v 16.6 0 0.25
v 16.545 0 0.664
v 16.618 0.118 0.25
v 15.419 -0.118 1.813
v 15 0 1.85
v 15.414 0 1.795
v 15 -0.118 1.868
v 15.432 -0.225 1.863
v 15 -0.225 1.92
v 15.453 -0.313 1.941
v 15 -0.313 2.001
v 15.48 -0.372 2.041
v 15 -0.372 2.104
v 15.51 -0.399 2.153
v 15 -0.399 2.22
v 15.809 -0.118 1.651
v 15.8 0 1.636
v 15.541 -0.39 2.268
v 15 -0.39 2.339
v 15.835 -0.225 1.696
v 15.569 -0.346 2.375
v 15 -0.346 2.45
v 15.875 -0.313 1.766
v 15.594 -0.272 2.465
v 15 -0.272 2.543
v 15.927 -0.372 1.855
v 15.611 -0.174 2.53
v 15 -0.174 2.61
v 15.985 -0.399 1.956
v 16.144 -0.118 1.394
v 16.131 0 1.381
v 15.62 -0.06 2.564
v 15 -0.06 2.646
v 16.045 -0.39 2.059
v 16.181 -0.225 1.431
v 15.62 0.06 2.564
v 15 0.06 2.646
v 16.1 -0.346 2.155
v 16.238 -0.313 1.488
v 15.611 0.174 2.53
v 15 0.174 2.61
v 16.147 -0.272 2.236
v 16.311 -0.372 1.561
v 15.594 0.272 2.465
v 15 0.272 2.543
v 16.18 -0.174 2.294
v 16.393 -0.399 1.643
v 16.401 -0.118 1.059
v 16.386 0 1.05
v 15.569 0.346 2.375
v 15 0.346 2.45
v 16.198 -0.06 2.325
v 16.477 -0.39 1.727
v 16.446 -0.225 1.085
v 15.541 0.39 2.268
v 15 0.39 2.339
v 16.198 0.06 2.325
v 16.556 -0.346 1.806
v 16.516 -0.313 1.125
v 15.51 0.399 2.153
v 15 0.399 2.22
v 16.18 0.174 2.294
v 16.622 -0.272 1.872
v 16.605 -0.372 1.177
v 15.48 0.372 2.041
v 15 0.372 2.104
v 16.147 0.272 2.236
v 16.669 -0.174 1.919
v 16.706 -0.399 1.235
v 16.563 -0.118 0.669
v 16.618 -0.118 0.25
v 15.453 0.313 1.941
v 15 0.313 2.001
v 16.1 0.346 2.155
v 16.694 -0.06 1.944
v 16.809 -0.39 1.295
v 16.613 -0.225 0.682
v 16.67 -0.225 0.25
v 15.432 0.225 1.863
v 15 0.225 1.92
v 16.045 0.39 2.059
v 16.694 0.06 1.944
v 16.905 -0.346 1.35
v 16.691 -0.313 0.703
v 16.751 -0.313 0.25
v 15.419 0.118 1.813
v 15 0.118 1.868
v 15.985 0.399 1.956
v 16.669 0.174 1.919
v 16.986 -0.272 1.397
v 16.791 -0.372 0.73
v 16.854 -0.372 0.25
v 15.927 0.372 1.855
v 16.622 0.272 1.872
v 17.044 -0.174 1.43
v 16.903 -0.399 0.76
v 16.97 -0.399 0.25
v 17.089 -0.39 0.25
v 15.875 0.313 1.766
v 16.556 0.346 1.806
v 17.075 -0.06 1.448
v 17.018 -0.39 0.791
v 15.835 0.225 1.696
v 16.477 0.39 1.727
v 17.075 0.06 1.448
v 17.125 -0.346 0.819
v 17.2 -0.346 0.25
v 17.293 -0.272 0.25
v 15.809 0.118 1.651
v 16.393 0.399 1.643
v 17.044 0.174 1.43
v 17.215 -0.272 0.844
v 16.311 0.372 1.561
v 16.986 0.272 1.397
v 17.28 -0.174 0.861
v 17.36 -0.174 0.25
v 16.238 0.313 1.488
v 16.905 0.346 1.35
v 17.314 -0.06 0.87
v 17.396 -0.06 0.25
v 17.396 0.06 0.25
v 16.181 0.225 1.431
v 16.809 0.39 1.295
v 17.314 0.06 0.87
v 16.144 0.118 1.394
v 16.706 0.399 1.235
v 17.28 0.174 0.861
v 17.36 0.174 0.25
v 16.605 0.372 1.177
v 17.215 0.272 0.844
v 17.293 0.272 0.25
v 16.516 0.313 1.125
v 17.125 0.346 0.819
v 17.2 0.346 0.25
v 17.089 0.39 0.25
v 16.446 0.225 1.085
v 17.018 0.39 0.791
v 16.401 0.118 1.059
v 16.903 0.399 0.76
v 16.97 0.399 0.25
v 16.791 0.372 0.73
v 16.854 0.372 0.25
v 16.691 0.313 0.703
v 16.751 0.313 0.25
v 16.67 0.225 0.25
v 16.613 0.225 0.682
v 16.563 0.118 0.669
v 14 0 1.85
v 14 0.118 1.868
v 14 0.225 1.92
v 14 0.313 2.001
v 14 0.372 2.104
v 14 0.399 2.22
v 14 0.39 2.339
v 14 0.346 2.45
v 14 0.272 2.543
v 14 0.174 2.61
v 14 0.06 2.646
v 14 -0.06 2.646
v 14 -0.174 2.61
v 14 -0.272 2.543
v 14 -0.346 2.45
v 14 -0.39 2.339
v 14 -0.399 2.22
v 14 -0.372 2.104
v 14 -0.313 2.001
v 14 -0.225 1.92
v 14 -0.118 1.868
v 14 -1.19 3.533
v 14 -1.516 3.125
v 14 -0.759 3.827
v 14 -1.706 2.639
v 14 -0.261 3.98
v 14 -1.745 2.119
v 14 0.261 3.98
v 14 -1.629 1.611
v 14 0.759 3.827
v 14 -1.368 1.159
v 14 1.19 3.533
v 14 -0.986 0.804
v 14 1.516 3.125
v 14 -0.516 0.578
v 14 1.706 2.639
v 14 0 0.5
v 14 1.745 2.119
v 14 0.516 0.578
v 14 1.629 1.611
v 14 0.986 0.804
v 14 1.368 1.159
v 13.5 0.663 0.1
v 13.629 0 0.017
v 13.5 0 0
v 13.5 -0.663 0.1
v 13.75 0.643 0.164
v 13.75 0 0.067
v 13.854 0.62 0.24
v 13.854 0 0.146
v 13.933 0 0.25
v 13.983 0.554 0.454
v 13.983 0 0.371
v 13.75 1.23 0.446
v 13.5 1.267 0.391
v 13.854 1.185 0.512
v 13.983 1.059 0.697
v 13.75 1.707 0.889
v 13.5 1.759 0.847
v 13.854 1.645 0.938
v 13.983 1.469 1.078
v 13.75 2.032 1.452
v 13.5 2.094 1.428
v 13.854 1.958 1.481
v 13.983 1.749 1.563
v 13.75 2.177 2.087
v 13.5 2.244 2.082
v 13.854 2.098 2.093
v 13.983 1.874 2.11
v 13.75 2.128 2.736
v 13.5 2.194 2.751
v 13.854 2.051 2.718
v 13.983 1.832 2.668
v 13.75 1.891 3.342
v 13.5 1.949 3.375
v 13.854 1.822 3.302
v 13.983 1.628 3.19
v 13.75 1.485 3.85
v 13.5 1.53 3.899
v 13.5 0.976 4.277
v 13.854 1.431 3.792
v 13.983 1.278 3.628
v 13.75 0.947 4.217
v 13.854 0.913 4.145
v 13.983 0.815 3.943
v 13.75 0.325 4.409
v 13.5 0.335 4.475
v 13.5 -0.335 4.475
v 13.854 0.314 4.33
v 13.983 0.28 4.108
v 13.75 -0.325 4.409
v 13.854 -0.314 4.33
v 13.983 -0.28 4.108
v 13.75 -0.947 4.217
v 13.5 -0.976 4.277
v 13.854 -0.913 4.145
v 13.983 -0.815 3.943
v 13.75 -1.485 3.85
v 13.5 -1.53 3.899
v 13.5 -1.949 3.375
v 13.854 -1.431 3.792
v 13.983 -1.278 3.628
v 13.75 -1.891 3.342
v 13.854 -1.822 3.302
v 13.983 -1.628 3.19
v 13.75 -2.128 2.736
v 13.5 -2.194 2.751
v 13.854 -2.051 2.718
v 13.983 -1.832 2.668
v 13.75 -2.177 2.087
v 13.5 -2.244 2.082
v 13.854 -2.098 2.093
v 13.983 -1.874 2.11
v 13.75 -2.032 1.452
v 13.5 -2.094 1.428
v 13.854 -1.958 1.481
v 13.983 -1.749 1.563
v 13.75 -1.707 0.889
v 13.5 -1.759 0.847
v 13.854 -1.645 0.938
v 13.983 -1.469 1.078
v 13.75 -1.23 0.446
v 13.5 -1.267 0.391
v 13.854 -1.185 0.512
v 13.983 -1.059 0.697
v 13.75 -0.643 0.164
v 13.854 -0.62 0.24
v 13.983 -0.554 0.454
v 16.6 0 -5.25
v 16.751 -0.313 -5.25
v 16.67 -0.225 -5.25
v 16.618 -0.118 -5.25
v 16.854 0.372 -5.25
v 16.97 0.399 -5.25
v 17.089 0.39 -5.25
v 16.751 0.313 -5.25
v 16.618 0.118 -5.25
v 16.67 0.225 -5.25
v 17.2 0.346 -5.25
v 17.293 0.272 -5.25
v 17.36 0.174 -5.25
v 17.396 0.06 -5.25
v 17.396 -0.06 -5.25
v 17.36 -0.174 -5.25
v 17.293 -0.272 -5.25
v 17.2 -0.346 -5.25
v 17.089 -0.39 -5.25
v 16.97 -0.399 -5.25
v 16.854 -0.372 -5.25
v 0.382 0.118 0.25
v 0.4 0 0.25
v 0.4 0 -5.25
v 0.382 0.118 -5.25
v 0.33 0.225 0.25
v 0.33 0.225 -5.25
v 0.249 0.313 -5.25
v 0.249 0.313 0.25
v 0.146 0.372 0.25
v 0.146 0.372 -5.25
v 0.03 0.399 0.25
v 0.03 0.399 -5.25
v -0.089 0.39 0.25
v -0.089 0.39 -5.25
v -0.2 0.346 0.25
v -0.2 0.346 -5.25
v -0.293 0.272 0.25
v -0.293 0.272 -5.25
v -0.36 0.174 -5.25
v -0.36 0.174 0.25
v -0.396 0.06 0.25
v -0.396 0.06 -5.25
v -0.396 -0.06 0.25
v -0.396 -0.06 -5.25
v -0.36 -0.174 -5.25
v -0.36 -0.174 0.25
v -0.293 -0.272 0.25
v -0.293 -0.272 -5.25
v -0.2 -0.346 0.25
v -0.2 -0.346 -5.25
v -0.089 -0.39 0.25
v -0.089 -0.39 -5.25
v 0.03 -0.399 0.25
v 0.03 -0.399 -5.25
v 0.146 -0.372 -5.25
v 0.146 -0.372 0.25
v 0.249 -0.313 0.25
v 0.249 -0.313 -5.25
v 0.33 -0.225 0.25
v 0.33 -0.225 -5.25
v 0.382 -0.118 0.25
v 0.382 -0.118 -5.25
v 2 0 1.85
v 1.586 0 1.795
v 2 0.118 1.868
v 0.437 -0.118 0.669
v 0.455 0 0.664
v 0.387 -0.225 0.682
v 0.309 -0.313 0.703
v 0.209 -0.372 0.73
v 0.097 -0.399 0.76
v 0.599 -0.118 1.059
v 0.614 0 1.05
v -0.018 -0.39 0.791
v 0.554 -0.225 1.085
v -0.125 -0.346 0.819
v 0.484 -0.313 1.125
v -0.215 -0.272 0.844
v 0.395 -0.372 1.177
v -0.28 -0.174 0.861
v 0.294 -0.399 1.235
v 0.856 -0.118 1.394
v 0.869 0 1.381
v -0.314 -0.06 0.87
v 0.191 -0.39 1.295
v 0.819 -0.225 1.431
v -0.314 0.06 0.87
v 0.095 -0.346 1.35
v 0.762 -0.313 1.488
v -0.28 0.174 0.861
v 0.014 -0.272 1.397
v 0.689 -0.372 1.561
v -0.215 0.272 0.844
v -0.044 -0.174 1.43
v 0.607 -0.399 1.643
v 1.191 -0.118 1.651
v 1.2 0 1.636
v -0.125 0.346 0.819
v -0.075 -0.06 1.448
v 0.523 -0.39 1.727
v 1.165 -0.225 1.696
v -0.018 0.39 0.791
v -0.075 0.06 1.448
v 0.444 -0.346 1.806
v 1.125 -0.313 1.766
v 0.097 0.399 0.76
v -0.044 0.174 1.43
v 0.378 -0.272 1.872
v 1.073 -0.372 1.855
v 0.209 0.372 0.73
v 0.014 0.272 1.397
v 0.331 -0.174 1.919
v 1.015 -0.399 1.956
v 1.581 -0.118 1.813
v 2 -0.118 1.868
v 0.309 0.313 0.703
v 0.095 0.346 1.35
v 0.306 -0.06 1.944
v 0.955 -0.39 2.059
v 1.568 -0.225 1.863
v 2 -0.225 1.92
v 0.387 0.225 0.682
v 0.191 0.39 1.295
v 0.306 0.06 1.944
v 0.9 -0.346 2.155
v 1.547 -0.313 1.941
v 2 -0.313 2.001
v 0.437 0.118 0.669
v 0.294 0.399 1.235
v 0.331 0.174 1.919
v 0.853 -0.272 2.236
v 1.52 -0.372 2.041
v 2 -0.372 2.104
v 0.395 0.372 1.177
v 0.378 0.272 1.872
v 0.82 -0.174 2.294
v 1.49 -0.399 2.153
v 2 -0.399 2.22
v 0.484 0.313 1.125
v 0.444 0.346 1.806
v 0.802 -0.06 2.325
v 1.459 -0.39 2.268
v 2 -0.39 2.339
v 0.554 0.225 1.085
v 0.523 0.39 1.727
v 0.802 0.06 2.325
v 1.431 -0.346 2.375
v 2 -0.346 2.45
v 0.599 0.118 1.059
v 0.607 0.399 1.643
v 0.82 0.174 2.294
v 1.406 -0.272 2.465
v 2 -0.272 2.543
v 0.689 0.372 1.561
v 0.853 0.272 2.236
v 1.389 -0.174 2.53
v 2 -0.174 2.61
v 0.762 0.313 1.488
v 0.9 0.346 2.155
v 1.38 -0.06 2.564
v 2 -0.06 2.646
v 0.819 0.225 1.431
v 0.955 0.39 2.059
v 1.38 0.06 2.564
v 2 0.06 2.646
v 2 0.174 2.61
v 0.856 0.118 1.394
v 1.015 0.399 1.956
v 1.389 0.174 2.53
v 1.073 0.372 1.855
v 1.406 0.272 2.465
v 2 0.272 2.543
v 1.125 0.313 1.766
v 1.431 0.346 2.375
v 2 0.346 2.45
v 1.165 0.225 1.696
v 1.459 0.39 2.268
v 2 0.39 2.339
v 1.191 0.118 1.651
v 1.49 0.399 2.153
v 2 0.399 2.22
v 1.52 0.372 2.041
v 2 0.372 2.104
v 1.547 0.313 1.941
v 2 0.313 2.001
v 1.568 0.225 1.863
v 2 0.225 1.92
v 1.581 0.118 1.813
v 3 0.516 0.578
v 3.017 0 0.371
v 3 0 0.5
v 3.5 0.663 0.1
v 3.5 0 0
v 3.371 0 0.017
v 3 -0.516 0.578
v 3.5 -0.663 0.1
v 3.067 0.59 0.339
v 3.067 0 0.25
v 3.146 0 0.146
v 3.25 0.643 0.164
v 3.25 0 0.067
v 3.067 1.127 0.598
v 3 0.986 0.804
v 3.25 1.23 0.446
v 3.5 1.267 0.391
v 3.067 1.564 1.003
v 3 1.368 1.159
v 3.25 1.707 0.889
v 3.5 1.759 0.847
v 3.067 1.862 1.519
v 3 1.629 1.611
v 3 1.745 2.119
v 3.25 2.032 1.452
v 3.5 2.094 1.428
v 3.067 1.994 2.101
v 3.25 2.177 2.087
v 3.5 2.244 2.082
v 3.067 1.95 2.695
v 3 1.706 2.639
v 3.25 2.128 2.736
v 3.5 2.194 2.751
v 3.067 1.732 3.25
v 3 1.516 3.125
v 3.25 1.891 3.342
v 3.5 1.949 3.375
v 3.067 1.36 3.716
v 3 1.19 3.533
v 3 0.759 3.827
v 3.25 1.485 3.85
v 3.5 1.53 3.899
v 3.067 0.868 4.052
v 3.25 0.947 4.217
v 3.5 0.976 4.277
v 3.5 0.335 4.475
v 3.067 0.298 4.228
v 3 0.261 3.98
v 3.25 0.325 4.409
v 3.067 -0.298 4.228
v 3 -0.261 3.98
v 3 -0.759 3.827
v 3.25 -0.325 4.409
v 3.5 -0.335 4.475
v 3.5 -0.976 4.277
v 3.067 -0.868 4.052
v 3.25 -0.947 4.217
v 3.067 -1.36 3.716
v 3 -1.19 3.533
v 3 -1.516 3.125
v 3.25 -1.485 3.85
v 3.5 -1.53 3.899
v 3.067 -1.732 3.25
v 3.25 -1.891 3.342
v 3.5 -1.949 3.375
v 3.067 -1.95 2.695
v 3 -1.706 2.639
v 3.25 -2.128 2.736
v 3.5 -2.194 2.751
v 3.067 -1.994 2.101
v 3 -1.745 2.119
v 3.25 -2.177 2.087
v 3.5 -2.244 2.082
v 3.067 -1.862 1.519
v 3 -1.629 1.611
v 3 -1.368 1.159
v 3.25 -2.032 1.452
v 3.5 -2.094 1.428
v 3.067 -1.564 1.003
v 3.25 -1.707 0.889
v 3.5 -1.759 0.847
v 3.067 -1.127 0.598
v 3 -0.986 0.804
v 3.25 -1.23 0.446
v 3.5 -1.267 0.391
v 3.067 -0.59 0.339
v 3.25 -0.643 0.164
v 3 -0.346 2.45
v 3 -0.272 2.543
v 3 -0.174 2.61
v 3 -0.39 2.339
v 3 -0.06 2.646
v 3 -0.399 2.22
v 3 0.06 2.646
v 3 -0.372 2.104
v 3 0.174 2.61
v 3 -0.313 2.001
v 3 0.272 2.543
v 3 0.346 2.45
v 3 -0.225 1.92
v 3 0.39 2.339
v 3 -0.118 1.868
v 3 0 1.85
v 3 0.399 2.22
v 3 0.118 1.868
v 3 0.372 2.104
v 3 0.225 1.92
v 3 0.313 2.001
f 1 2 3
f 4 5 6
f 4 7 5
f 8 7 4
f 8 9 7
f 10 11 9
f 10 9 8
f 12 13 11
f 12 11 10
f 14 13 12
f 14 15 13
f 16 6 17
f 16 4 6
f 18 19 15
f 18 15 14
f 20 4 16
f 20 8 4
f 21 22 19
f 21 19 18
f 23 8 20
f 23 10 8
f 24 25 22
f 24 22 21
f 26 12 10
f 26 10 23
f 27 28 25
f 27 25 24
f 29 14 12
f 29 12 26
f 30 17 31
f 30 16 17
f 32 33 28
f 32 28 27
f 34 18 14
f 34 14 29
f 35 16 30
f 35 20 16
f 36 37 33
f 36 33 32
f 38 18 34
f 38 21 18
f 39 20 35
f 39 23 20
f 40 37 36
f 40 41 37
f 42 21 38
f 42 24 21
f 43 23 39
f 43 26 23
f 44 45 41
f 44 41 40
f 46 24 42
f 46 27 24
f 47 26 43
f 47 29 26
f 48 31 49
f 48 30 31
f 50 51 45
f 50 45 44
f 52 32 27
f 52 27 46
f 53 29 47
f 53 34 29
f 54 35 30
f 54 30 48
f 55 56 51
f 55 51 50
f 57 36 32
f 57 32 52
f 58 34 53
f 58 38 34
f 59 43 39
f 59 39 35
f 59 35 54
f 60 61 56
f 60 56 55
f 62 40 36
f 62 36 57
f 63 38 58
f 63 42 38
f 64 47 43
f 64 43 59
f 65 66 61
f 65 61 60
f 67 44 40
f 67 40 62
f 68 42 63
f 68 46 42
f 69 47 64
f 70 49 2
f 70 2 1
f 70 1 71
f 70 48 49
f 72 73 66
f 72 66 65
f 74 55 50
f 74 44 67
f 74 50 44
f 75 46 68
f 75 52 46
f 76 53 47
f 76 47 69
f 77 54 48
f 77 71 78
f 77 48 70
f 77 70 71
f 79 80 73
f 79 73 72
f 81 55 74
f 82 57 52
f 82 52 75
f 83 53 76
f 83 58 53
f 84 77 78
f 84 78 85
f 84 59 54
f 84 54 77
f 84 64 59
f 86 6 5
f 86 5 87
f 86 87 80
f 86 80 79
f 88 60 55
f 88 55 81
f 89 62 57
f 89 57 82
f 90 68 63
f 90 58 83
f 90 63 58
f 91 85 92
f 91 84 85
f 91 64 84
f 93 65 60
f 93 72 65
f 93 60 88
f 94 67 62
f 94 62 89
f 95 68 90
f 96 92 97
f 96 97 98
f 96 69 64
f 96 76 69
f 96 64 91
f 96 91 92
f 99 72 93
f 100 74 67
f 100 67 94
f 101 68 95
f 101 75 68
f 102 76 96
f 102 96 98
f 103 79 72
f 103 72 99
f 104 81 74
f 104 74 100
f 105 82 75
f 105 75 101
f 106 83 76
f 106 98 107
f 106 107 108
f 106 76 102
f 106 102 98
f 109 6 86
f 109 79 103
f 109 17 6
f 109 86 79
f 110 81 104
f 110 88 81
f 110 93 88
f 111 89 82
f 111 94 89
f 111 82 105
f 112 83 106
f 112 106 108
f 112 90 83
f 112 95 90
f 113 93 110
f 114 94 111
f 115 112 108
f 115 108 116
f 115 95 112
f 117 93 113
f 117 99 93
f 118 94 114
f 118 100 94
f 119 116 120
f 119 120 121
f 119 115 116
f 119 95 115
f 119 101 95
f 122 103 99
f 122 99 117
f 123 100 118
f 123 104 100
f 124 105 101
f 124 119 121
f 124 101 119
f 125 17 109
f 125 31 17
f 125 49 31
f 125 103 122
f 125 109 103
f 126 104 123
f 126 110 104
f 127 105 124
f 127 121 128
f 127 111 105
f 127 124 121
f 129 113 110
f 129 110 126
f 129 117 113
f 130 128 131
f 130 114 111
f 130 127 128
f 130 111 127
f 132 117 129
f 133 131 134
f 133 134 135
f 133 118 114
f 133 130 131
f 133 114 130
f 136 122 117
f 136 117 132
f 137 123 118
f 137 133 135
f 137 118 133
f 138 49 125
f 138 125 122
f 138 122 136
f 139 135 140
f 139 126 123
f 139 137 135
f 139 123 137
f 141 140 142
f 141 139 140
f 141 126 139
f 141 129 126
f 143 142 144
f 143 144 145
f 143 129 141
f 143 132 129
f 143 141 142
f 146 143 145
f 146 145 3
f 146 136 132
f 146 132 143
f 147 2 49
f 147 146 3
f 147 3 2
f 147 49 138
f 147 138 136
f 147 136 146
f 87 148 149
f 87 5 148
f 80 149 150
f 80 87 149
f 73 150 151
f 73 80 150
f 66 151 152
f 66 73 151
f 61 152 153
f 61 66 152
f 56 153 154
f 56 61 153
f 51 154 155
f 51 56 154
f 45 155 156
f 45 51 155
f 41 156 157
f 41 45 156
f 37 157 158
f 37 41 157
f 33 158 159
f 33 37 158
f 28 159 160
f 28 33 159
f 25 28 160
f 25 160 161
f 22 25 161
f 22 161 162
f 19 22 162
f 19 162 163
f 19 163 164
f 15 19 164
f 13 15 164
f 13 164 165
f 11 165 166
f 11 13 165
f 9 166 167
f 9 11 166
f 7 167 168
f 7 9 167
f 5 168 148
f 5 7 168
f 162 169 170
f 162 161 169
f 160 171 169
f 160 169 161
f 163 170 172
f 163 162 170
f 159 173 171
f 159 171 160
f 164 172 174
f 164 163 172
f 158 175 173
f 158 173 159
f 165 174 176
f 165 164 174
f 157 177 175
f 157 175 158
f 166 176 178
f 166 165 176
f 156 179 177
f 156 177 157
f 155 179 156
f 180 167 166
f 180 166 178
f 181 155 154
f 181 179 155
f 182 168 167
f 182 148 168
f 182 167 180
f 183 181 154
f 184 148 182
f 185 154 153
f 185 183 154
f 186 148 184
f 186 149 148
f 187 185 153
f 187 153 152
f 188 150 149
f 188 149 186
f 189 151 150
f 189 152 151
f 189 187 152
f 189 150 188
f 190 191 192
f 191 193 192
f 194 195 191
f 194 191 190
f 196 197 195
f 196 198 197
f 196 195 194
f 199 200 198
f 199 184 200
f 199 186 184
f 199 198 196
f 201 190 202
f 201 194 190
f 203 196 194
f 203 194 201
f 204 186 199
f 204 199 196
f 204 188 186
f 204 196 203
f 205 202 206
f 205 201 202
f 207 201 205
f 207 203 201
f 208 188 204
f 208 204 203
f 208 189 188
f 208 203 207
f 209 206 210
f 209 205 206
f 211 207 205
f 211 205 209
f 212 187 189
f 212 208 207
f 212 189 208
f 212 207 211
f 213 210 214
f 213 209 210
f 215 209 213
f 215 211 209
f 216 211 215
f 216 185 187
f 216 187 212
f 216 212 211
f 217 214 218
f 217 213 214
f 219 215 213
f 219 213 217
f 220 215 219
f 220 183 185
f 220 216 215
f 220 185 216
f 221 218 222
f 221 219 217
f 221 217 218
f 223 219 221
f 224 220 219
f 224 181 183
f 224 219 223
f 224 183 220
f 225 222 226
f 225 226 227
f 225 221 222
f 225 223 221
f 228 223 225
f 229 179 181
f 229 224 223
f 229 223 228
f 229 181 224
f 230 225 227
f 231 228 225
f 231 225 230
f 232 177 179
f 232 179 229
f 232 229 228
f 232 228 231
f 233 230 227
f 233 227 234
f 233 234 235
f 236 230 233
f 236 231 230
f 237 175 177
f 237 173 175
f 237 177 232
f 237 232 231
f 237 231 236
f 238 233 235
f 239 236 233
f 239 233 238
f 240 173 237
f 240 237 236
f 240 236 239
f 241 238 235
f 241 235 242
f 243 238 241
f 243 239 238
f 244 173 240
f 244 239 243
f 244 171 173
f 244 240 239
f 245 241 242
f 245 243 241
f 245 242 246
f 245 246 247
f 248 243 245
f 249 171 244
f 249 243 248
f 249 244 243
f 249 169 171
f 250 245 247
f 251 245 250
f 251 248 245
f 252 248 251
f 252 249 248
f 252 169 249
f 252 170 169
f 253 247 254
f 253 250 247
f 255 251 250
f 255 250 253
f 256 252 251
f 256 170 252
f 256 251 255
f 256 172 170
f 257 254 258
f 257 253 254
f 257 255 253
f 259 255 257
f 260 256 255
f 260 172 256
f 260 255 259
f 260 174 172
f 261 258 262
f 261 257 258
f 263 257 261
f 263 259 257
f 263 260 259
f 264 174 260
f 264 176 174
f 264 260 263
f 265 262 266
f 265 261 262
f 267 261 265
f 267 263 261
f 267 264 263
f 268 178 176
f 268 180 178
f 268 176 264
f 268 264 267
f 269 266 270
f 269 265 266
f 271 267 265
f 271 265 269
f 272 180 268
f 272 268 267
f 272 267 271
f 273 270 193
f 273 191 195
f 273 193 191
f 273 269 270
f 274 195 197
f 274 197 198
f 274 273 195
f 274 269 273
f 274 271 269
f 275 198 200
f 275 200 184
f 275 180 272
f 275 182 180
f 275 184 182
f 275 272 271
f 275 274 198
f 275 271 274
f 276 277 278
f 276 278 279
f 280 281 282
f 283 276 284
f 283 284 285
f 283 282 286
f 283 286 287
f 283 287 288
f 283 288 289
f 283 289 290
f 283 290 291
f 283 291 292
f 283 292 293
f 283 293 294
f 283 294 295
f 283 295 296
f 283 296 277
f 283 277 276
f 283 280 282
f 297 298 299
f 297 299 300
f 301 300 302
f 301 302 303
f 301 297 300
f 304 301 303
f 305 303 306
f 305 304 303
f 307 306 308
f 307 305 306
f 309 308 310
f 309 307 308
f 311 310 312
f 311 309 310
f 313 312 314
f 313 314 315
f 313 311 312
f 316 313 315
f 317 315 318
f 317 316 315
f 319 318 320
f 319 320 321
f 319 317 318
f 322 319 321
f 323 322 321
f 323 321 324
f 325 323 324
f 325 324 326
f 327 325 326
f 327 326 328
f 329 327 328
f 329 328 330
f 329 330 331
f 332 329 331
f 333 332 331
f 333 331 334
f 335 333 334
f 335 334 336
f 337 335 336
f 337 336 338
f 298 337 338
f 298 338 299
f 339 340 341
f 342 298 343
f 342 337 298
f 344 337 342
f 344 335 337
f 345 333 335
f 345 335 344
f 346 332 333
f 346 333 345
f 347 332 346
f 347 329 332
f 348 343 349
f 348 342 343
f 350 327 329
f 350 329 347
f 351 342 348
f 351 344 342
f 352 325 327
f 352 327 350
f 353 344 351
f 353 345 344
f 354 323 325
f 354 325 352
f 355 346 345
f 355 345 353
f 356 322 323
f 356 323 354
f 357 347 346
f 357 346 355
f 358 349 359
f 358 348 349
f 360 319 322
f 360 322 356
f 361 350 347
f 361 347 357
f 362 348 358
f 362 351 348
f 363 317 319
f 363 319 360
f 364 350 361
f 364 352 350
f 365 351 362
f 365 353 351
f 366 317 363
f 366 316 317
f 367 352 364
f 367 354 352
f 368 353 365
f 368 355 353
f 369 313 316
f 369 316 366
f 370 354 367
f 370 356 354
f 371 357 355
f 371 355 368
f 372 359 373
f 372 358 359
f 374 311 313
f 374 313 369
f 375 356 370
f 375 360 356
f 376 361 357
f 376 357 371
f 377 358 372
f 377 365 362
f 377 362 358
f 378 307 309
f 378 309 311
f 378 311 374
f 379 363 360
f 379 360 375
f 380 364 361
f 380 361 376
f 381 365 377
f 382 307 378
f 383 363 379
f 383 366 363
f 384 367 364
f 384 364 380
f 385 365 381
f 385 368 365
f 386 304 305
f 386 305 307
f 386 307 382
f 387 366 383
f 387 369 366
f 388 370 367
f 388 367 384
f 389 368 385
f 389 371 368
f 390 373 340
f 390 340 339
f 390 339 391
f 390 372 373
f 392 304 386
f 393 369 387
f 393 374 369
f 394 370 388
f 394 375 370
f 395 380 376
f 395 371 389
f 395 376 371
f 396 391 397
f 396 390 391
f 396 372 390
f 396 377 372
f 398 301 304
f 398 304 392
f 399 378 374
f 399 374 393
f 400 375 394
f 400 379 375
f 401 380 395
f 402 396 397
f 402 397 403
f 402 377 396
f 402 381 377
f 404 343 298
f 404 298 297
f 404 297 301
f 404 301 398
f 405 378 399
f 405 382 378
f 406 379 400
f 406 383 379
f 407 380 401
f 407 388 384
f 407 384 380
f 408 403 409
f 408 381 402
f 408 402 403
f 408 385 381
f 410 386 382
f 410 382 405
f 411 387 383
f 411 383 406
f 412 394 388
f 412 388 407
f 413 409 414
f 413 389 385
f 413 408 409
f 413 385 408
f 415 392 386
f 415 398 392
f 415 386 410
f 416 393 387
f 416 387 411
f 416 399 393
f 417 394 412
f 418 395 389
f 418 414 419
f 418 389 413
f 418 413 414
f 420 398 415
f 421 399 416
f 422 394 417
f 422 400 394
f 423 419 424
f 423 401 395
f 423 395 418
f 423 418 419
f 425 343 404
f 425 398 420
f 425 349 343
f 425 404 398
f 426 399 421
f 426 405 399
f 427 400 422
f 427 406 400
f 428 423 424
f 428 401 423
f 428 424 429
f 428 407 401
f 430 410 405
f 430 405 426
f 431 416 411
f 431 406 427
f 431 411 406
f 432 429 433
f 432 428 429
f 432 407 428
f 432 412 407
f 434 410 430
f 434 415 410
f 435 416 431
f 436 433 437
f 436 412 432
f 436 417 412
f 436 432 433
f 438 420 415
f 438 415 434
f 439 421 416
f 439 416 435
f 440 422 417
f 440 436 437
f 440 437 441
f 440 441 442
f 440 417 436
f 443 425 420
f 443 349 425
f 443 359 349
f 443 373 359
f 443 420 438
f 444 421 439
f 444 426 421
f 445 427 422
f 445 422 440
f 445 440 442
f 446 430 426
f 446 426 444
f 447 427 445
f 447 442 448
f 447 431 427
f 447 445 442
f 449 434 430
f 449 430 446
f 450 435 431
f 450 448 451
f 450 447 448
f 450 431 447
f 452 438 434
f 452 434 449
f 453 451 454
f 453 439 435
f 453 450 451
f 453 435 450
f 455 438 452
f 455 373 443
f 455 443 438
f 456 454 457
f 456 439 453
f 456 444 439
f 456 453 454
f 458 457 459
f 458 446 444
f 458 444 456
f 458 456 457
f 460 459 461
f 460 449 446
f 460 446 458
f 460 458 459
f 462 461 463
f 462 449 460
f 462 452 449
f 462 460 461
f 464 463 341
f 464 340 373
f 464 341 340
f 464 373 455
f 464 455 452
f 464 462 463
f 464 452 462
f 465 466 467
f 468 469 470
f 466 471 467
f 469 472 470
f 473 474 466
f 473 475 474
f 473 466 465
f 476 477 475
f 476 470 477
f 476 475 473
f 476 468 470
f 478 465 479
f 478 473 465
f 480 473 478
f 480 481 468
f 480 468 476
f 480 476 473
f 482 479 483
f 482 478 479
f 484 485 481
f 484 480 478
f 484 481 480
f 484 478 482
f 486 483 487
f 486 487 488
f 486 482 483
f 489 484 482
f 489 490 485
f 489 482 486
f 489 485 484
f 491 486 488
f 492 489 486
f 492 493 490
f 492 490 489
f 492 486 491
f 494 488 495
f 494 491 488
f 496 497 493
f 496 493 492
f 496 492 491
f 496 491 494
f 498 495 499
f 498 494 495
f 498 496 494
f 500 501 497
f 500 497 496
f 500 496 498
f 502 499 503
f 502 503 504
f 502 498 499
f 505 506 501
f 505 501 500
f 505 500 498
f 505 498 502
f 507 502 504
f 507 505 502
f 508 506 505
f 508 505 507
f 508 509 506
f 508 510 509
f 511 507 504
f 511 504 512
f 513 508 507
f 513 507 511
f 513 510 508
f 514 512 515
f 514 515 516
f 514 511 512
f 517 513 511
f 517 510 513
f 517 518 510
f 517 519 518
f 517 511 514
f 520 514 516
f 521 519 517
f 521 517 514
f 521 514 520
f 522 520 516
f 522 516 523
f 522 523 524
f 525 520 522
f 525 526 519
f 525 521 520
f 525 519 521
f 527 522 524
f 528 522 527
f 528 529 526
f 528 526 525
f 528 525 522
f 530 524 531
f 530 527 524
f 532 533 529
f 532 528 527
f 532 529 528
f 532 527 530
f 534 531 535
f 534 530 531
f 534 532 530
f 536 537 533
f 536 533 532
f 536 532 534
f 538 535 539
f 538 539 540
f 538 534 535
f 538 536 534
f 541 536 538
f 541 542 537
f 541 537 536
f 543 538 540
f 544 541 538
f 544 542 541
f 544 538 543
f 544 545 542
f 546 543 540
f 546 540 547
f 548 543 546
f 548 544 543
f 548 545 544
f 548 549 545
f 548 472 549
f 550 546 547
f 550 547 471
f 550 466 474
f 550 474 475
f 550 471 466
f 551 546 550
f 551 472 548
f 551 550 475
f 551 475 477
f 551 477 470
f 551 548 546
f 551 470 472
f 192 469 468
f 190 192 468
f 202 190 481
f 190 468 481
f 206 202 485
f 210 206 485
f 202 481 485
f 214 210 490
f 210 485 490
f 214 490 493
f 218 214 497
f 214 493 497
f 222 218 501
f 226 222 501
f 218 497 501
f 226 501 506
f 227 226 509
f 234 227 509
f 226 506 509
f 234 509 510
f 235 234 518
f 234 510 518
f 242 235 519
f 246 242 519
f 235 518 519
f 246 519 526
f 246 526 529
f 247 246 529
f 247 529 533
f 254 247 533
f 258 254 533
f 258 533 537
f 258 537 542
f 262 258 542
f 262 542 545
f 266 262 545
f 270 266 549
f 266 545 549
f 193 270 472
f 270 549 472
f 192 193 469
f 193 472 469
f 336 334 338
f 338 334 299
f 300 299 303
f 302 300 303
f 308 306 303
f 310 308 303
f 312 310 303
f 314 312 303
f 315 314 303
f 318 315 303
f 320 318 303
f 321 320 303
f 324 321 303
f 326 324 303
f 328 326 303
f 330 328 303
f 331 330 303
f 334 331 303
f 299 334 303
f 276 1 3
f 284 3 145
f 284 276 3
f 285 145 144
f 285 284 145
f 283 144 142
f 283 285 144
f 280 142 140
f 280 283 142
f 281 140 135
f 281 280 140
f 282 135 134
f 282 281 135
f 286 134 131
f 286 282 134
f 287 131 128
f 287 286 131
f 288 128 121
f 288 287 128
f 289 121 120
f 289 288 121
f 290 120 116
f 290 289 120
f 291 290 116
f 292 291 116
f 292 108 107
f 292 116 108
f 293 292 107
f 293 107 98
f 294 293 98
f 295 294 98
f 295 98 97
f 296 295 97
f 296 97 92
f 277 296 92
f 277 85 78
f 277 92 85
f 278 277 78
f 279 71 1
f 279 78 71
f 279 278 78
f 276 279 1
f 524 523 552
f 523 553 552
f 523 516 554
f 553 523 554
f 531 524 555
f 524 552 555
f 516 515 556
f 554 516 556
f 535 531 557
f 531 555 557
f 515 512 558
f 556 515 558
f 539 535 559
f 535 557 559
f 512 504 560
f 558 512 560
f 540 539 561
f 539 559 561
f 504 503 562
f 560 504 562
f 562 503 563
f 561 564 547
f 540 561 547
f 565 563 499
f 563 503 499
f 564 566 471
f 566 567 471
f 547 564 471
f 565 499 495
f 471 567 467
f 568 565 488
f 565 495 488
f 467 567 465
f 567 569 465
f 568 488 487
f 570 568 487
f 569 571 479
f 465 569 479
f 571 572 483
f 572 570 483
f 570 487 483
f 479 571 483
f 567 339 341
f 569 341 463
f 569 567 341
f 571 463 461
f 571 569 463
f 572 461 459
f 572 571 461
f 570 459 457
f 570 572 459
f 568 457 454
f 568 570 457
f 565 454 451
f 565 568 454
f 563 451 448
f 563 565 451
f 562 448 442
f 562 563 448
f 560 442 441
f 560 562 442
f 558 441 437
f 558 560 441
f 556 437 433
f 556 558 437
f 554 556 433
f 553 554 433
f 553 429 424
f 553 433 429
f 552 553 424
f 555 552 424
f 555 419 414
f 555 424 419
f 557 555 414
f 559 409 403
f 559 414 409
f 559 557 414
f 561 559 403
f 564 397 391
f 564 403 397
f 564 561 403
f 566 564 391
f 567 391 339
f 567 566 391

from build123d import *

# Parameters (mm, degrees)
SKETCH_3_R      = 2.25
EXTRUDE_1_DEPTH = 11
SKETCH_4_R      = 0.4
FILLET_1_R      = 0.5


with BuildPart() as part:
    # Эскиз3 → Вытянуть1 (new body)
    with BuildSketch(Plane(origin=(3, 0, 0), x_dir=(0, 0, -1), z_dir=(1, 0, 0))):
        with Locations((-2.25, 0)):
            Circle(SKETCH_3_R)
    extrude(amount=EXTRUDE_1_DEPTH)

    # По траектории1: sweep along a path in Эскиз5
    with BuildLine(Plane(origin=(0, 0, 0), x_dir=(1, 0, 0), z_dir=(0, 1, 0))) as sweep_1_path:
        Line((0, 5.25), (0, -0.25))
        ThreePointArc((0, -0.25), (0.585786438, -1.664213562), (2, -2.25))
        Line((2, -2.25), (2.965757317, -2.25))
        Line((2.965757317, -2.25), (14, -2.25))
        Line((14, -2.25), (15, -2.25))
        ThreePointArc((15, -2.25), (16.414213562, -1.664213562), (17, -0.25))
        Line((17, -0.25), (17, 0))
        Line((17, 0), (17, 5.250003271))
    # Эскиз4 → По траектории1 (sweep)
    with BuildSketch(Plane.XY.offset(-5.25)):
        Circle(SKETCH_4_R)
    sweep(path=sweep_1_path.line)

    # Скругление1
    fillet_1_edges = [part.edges().sort_by_distance(p)[0] for p in [
        (3, 0, 4.5),
        (14, 0, 4.5),
    ]]
    fillet(fillet_1_edges, radius=FILLET_1_R)


solid = part.part
